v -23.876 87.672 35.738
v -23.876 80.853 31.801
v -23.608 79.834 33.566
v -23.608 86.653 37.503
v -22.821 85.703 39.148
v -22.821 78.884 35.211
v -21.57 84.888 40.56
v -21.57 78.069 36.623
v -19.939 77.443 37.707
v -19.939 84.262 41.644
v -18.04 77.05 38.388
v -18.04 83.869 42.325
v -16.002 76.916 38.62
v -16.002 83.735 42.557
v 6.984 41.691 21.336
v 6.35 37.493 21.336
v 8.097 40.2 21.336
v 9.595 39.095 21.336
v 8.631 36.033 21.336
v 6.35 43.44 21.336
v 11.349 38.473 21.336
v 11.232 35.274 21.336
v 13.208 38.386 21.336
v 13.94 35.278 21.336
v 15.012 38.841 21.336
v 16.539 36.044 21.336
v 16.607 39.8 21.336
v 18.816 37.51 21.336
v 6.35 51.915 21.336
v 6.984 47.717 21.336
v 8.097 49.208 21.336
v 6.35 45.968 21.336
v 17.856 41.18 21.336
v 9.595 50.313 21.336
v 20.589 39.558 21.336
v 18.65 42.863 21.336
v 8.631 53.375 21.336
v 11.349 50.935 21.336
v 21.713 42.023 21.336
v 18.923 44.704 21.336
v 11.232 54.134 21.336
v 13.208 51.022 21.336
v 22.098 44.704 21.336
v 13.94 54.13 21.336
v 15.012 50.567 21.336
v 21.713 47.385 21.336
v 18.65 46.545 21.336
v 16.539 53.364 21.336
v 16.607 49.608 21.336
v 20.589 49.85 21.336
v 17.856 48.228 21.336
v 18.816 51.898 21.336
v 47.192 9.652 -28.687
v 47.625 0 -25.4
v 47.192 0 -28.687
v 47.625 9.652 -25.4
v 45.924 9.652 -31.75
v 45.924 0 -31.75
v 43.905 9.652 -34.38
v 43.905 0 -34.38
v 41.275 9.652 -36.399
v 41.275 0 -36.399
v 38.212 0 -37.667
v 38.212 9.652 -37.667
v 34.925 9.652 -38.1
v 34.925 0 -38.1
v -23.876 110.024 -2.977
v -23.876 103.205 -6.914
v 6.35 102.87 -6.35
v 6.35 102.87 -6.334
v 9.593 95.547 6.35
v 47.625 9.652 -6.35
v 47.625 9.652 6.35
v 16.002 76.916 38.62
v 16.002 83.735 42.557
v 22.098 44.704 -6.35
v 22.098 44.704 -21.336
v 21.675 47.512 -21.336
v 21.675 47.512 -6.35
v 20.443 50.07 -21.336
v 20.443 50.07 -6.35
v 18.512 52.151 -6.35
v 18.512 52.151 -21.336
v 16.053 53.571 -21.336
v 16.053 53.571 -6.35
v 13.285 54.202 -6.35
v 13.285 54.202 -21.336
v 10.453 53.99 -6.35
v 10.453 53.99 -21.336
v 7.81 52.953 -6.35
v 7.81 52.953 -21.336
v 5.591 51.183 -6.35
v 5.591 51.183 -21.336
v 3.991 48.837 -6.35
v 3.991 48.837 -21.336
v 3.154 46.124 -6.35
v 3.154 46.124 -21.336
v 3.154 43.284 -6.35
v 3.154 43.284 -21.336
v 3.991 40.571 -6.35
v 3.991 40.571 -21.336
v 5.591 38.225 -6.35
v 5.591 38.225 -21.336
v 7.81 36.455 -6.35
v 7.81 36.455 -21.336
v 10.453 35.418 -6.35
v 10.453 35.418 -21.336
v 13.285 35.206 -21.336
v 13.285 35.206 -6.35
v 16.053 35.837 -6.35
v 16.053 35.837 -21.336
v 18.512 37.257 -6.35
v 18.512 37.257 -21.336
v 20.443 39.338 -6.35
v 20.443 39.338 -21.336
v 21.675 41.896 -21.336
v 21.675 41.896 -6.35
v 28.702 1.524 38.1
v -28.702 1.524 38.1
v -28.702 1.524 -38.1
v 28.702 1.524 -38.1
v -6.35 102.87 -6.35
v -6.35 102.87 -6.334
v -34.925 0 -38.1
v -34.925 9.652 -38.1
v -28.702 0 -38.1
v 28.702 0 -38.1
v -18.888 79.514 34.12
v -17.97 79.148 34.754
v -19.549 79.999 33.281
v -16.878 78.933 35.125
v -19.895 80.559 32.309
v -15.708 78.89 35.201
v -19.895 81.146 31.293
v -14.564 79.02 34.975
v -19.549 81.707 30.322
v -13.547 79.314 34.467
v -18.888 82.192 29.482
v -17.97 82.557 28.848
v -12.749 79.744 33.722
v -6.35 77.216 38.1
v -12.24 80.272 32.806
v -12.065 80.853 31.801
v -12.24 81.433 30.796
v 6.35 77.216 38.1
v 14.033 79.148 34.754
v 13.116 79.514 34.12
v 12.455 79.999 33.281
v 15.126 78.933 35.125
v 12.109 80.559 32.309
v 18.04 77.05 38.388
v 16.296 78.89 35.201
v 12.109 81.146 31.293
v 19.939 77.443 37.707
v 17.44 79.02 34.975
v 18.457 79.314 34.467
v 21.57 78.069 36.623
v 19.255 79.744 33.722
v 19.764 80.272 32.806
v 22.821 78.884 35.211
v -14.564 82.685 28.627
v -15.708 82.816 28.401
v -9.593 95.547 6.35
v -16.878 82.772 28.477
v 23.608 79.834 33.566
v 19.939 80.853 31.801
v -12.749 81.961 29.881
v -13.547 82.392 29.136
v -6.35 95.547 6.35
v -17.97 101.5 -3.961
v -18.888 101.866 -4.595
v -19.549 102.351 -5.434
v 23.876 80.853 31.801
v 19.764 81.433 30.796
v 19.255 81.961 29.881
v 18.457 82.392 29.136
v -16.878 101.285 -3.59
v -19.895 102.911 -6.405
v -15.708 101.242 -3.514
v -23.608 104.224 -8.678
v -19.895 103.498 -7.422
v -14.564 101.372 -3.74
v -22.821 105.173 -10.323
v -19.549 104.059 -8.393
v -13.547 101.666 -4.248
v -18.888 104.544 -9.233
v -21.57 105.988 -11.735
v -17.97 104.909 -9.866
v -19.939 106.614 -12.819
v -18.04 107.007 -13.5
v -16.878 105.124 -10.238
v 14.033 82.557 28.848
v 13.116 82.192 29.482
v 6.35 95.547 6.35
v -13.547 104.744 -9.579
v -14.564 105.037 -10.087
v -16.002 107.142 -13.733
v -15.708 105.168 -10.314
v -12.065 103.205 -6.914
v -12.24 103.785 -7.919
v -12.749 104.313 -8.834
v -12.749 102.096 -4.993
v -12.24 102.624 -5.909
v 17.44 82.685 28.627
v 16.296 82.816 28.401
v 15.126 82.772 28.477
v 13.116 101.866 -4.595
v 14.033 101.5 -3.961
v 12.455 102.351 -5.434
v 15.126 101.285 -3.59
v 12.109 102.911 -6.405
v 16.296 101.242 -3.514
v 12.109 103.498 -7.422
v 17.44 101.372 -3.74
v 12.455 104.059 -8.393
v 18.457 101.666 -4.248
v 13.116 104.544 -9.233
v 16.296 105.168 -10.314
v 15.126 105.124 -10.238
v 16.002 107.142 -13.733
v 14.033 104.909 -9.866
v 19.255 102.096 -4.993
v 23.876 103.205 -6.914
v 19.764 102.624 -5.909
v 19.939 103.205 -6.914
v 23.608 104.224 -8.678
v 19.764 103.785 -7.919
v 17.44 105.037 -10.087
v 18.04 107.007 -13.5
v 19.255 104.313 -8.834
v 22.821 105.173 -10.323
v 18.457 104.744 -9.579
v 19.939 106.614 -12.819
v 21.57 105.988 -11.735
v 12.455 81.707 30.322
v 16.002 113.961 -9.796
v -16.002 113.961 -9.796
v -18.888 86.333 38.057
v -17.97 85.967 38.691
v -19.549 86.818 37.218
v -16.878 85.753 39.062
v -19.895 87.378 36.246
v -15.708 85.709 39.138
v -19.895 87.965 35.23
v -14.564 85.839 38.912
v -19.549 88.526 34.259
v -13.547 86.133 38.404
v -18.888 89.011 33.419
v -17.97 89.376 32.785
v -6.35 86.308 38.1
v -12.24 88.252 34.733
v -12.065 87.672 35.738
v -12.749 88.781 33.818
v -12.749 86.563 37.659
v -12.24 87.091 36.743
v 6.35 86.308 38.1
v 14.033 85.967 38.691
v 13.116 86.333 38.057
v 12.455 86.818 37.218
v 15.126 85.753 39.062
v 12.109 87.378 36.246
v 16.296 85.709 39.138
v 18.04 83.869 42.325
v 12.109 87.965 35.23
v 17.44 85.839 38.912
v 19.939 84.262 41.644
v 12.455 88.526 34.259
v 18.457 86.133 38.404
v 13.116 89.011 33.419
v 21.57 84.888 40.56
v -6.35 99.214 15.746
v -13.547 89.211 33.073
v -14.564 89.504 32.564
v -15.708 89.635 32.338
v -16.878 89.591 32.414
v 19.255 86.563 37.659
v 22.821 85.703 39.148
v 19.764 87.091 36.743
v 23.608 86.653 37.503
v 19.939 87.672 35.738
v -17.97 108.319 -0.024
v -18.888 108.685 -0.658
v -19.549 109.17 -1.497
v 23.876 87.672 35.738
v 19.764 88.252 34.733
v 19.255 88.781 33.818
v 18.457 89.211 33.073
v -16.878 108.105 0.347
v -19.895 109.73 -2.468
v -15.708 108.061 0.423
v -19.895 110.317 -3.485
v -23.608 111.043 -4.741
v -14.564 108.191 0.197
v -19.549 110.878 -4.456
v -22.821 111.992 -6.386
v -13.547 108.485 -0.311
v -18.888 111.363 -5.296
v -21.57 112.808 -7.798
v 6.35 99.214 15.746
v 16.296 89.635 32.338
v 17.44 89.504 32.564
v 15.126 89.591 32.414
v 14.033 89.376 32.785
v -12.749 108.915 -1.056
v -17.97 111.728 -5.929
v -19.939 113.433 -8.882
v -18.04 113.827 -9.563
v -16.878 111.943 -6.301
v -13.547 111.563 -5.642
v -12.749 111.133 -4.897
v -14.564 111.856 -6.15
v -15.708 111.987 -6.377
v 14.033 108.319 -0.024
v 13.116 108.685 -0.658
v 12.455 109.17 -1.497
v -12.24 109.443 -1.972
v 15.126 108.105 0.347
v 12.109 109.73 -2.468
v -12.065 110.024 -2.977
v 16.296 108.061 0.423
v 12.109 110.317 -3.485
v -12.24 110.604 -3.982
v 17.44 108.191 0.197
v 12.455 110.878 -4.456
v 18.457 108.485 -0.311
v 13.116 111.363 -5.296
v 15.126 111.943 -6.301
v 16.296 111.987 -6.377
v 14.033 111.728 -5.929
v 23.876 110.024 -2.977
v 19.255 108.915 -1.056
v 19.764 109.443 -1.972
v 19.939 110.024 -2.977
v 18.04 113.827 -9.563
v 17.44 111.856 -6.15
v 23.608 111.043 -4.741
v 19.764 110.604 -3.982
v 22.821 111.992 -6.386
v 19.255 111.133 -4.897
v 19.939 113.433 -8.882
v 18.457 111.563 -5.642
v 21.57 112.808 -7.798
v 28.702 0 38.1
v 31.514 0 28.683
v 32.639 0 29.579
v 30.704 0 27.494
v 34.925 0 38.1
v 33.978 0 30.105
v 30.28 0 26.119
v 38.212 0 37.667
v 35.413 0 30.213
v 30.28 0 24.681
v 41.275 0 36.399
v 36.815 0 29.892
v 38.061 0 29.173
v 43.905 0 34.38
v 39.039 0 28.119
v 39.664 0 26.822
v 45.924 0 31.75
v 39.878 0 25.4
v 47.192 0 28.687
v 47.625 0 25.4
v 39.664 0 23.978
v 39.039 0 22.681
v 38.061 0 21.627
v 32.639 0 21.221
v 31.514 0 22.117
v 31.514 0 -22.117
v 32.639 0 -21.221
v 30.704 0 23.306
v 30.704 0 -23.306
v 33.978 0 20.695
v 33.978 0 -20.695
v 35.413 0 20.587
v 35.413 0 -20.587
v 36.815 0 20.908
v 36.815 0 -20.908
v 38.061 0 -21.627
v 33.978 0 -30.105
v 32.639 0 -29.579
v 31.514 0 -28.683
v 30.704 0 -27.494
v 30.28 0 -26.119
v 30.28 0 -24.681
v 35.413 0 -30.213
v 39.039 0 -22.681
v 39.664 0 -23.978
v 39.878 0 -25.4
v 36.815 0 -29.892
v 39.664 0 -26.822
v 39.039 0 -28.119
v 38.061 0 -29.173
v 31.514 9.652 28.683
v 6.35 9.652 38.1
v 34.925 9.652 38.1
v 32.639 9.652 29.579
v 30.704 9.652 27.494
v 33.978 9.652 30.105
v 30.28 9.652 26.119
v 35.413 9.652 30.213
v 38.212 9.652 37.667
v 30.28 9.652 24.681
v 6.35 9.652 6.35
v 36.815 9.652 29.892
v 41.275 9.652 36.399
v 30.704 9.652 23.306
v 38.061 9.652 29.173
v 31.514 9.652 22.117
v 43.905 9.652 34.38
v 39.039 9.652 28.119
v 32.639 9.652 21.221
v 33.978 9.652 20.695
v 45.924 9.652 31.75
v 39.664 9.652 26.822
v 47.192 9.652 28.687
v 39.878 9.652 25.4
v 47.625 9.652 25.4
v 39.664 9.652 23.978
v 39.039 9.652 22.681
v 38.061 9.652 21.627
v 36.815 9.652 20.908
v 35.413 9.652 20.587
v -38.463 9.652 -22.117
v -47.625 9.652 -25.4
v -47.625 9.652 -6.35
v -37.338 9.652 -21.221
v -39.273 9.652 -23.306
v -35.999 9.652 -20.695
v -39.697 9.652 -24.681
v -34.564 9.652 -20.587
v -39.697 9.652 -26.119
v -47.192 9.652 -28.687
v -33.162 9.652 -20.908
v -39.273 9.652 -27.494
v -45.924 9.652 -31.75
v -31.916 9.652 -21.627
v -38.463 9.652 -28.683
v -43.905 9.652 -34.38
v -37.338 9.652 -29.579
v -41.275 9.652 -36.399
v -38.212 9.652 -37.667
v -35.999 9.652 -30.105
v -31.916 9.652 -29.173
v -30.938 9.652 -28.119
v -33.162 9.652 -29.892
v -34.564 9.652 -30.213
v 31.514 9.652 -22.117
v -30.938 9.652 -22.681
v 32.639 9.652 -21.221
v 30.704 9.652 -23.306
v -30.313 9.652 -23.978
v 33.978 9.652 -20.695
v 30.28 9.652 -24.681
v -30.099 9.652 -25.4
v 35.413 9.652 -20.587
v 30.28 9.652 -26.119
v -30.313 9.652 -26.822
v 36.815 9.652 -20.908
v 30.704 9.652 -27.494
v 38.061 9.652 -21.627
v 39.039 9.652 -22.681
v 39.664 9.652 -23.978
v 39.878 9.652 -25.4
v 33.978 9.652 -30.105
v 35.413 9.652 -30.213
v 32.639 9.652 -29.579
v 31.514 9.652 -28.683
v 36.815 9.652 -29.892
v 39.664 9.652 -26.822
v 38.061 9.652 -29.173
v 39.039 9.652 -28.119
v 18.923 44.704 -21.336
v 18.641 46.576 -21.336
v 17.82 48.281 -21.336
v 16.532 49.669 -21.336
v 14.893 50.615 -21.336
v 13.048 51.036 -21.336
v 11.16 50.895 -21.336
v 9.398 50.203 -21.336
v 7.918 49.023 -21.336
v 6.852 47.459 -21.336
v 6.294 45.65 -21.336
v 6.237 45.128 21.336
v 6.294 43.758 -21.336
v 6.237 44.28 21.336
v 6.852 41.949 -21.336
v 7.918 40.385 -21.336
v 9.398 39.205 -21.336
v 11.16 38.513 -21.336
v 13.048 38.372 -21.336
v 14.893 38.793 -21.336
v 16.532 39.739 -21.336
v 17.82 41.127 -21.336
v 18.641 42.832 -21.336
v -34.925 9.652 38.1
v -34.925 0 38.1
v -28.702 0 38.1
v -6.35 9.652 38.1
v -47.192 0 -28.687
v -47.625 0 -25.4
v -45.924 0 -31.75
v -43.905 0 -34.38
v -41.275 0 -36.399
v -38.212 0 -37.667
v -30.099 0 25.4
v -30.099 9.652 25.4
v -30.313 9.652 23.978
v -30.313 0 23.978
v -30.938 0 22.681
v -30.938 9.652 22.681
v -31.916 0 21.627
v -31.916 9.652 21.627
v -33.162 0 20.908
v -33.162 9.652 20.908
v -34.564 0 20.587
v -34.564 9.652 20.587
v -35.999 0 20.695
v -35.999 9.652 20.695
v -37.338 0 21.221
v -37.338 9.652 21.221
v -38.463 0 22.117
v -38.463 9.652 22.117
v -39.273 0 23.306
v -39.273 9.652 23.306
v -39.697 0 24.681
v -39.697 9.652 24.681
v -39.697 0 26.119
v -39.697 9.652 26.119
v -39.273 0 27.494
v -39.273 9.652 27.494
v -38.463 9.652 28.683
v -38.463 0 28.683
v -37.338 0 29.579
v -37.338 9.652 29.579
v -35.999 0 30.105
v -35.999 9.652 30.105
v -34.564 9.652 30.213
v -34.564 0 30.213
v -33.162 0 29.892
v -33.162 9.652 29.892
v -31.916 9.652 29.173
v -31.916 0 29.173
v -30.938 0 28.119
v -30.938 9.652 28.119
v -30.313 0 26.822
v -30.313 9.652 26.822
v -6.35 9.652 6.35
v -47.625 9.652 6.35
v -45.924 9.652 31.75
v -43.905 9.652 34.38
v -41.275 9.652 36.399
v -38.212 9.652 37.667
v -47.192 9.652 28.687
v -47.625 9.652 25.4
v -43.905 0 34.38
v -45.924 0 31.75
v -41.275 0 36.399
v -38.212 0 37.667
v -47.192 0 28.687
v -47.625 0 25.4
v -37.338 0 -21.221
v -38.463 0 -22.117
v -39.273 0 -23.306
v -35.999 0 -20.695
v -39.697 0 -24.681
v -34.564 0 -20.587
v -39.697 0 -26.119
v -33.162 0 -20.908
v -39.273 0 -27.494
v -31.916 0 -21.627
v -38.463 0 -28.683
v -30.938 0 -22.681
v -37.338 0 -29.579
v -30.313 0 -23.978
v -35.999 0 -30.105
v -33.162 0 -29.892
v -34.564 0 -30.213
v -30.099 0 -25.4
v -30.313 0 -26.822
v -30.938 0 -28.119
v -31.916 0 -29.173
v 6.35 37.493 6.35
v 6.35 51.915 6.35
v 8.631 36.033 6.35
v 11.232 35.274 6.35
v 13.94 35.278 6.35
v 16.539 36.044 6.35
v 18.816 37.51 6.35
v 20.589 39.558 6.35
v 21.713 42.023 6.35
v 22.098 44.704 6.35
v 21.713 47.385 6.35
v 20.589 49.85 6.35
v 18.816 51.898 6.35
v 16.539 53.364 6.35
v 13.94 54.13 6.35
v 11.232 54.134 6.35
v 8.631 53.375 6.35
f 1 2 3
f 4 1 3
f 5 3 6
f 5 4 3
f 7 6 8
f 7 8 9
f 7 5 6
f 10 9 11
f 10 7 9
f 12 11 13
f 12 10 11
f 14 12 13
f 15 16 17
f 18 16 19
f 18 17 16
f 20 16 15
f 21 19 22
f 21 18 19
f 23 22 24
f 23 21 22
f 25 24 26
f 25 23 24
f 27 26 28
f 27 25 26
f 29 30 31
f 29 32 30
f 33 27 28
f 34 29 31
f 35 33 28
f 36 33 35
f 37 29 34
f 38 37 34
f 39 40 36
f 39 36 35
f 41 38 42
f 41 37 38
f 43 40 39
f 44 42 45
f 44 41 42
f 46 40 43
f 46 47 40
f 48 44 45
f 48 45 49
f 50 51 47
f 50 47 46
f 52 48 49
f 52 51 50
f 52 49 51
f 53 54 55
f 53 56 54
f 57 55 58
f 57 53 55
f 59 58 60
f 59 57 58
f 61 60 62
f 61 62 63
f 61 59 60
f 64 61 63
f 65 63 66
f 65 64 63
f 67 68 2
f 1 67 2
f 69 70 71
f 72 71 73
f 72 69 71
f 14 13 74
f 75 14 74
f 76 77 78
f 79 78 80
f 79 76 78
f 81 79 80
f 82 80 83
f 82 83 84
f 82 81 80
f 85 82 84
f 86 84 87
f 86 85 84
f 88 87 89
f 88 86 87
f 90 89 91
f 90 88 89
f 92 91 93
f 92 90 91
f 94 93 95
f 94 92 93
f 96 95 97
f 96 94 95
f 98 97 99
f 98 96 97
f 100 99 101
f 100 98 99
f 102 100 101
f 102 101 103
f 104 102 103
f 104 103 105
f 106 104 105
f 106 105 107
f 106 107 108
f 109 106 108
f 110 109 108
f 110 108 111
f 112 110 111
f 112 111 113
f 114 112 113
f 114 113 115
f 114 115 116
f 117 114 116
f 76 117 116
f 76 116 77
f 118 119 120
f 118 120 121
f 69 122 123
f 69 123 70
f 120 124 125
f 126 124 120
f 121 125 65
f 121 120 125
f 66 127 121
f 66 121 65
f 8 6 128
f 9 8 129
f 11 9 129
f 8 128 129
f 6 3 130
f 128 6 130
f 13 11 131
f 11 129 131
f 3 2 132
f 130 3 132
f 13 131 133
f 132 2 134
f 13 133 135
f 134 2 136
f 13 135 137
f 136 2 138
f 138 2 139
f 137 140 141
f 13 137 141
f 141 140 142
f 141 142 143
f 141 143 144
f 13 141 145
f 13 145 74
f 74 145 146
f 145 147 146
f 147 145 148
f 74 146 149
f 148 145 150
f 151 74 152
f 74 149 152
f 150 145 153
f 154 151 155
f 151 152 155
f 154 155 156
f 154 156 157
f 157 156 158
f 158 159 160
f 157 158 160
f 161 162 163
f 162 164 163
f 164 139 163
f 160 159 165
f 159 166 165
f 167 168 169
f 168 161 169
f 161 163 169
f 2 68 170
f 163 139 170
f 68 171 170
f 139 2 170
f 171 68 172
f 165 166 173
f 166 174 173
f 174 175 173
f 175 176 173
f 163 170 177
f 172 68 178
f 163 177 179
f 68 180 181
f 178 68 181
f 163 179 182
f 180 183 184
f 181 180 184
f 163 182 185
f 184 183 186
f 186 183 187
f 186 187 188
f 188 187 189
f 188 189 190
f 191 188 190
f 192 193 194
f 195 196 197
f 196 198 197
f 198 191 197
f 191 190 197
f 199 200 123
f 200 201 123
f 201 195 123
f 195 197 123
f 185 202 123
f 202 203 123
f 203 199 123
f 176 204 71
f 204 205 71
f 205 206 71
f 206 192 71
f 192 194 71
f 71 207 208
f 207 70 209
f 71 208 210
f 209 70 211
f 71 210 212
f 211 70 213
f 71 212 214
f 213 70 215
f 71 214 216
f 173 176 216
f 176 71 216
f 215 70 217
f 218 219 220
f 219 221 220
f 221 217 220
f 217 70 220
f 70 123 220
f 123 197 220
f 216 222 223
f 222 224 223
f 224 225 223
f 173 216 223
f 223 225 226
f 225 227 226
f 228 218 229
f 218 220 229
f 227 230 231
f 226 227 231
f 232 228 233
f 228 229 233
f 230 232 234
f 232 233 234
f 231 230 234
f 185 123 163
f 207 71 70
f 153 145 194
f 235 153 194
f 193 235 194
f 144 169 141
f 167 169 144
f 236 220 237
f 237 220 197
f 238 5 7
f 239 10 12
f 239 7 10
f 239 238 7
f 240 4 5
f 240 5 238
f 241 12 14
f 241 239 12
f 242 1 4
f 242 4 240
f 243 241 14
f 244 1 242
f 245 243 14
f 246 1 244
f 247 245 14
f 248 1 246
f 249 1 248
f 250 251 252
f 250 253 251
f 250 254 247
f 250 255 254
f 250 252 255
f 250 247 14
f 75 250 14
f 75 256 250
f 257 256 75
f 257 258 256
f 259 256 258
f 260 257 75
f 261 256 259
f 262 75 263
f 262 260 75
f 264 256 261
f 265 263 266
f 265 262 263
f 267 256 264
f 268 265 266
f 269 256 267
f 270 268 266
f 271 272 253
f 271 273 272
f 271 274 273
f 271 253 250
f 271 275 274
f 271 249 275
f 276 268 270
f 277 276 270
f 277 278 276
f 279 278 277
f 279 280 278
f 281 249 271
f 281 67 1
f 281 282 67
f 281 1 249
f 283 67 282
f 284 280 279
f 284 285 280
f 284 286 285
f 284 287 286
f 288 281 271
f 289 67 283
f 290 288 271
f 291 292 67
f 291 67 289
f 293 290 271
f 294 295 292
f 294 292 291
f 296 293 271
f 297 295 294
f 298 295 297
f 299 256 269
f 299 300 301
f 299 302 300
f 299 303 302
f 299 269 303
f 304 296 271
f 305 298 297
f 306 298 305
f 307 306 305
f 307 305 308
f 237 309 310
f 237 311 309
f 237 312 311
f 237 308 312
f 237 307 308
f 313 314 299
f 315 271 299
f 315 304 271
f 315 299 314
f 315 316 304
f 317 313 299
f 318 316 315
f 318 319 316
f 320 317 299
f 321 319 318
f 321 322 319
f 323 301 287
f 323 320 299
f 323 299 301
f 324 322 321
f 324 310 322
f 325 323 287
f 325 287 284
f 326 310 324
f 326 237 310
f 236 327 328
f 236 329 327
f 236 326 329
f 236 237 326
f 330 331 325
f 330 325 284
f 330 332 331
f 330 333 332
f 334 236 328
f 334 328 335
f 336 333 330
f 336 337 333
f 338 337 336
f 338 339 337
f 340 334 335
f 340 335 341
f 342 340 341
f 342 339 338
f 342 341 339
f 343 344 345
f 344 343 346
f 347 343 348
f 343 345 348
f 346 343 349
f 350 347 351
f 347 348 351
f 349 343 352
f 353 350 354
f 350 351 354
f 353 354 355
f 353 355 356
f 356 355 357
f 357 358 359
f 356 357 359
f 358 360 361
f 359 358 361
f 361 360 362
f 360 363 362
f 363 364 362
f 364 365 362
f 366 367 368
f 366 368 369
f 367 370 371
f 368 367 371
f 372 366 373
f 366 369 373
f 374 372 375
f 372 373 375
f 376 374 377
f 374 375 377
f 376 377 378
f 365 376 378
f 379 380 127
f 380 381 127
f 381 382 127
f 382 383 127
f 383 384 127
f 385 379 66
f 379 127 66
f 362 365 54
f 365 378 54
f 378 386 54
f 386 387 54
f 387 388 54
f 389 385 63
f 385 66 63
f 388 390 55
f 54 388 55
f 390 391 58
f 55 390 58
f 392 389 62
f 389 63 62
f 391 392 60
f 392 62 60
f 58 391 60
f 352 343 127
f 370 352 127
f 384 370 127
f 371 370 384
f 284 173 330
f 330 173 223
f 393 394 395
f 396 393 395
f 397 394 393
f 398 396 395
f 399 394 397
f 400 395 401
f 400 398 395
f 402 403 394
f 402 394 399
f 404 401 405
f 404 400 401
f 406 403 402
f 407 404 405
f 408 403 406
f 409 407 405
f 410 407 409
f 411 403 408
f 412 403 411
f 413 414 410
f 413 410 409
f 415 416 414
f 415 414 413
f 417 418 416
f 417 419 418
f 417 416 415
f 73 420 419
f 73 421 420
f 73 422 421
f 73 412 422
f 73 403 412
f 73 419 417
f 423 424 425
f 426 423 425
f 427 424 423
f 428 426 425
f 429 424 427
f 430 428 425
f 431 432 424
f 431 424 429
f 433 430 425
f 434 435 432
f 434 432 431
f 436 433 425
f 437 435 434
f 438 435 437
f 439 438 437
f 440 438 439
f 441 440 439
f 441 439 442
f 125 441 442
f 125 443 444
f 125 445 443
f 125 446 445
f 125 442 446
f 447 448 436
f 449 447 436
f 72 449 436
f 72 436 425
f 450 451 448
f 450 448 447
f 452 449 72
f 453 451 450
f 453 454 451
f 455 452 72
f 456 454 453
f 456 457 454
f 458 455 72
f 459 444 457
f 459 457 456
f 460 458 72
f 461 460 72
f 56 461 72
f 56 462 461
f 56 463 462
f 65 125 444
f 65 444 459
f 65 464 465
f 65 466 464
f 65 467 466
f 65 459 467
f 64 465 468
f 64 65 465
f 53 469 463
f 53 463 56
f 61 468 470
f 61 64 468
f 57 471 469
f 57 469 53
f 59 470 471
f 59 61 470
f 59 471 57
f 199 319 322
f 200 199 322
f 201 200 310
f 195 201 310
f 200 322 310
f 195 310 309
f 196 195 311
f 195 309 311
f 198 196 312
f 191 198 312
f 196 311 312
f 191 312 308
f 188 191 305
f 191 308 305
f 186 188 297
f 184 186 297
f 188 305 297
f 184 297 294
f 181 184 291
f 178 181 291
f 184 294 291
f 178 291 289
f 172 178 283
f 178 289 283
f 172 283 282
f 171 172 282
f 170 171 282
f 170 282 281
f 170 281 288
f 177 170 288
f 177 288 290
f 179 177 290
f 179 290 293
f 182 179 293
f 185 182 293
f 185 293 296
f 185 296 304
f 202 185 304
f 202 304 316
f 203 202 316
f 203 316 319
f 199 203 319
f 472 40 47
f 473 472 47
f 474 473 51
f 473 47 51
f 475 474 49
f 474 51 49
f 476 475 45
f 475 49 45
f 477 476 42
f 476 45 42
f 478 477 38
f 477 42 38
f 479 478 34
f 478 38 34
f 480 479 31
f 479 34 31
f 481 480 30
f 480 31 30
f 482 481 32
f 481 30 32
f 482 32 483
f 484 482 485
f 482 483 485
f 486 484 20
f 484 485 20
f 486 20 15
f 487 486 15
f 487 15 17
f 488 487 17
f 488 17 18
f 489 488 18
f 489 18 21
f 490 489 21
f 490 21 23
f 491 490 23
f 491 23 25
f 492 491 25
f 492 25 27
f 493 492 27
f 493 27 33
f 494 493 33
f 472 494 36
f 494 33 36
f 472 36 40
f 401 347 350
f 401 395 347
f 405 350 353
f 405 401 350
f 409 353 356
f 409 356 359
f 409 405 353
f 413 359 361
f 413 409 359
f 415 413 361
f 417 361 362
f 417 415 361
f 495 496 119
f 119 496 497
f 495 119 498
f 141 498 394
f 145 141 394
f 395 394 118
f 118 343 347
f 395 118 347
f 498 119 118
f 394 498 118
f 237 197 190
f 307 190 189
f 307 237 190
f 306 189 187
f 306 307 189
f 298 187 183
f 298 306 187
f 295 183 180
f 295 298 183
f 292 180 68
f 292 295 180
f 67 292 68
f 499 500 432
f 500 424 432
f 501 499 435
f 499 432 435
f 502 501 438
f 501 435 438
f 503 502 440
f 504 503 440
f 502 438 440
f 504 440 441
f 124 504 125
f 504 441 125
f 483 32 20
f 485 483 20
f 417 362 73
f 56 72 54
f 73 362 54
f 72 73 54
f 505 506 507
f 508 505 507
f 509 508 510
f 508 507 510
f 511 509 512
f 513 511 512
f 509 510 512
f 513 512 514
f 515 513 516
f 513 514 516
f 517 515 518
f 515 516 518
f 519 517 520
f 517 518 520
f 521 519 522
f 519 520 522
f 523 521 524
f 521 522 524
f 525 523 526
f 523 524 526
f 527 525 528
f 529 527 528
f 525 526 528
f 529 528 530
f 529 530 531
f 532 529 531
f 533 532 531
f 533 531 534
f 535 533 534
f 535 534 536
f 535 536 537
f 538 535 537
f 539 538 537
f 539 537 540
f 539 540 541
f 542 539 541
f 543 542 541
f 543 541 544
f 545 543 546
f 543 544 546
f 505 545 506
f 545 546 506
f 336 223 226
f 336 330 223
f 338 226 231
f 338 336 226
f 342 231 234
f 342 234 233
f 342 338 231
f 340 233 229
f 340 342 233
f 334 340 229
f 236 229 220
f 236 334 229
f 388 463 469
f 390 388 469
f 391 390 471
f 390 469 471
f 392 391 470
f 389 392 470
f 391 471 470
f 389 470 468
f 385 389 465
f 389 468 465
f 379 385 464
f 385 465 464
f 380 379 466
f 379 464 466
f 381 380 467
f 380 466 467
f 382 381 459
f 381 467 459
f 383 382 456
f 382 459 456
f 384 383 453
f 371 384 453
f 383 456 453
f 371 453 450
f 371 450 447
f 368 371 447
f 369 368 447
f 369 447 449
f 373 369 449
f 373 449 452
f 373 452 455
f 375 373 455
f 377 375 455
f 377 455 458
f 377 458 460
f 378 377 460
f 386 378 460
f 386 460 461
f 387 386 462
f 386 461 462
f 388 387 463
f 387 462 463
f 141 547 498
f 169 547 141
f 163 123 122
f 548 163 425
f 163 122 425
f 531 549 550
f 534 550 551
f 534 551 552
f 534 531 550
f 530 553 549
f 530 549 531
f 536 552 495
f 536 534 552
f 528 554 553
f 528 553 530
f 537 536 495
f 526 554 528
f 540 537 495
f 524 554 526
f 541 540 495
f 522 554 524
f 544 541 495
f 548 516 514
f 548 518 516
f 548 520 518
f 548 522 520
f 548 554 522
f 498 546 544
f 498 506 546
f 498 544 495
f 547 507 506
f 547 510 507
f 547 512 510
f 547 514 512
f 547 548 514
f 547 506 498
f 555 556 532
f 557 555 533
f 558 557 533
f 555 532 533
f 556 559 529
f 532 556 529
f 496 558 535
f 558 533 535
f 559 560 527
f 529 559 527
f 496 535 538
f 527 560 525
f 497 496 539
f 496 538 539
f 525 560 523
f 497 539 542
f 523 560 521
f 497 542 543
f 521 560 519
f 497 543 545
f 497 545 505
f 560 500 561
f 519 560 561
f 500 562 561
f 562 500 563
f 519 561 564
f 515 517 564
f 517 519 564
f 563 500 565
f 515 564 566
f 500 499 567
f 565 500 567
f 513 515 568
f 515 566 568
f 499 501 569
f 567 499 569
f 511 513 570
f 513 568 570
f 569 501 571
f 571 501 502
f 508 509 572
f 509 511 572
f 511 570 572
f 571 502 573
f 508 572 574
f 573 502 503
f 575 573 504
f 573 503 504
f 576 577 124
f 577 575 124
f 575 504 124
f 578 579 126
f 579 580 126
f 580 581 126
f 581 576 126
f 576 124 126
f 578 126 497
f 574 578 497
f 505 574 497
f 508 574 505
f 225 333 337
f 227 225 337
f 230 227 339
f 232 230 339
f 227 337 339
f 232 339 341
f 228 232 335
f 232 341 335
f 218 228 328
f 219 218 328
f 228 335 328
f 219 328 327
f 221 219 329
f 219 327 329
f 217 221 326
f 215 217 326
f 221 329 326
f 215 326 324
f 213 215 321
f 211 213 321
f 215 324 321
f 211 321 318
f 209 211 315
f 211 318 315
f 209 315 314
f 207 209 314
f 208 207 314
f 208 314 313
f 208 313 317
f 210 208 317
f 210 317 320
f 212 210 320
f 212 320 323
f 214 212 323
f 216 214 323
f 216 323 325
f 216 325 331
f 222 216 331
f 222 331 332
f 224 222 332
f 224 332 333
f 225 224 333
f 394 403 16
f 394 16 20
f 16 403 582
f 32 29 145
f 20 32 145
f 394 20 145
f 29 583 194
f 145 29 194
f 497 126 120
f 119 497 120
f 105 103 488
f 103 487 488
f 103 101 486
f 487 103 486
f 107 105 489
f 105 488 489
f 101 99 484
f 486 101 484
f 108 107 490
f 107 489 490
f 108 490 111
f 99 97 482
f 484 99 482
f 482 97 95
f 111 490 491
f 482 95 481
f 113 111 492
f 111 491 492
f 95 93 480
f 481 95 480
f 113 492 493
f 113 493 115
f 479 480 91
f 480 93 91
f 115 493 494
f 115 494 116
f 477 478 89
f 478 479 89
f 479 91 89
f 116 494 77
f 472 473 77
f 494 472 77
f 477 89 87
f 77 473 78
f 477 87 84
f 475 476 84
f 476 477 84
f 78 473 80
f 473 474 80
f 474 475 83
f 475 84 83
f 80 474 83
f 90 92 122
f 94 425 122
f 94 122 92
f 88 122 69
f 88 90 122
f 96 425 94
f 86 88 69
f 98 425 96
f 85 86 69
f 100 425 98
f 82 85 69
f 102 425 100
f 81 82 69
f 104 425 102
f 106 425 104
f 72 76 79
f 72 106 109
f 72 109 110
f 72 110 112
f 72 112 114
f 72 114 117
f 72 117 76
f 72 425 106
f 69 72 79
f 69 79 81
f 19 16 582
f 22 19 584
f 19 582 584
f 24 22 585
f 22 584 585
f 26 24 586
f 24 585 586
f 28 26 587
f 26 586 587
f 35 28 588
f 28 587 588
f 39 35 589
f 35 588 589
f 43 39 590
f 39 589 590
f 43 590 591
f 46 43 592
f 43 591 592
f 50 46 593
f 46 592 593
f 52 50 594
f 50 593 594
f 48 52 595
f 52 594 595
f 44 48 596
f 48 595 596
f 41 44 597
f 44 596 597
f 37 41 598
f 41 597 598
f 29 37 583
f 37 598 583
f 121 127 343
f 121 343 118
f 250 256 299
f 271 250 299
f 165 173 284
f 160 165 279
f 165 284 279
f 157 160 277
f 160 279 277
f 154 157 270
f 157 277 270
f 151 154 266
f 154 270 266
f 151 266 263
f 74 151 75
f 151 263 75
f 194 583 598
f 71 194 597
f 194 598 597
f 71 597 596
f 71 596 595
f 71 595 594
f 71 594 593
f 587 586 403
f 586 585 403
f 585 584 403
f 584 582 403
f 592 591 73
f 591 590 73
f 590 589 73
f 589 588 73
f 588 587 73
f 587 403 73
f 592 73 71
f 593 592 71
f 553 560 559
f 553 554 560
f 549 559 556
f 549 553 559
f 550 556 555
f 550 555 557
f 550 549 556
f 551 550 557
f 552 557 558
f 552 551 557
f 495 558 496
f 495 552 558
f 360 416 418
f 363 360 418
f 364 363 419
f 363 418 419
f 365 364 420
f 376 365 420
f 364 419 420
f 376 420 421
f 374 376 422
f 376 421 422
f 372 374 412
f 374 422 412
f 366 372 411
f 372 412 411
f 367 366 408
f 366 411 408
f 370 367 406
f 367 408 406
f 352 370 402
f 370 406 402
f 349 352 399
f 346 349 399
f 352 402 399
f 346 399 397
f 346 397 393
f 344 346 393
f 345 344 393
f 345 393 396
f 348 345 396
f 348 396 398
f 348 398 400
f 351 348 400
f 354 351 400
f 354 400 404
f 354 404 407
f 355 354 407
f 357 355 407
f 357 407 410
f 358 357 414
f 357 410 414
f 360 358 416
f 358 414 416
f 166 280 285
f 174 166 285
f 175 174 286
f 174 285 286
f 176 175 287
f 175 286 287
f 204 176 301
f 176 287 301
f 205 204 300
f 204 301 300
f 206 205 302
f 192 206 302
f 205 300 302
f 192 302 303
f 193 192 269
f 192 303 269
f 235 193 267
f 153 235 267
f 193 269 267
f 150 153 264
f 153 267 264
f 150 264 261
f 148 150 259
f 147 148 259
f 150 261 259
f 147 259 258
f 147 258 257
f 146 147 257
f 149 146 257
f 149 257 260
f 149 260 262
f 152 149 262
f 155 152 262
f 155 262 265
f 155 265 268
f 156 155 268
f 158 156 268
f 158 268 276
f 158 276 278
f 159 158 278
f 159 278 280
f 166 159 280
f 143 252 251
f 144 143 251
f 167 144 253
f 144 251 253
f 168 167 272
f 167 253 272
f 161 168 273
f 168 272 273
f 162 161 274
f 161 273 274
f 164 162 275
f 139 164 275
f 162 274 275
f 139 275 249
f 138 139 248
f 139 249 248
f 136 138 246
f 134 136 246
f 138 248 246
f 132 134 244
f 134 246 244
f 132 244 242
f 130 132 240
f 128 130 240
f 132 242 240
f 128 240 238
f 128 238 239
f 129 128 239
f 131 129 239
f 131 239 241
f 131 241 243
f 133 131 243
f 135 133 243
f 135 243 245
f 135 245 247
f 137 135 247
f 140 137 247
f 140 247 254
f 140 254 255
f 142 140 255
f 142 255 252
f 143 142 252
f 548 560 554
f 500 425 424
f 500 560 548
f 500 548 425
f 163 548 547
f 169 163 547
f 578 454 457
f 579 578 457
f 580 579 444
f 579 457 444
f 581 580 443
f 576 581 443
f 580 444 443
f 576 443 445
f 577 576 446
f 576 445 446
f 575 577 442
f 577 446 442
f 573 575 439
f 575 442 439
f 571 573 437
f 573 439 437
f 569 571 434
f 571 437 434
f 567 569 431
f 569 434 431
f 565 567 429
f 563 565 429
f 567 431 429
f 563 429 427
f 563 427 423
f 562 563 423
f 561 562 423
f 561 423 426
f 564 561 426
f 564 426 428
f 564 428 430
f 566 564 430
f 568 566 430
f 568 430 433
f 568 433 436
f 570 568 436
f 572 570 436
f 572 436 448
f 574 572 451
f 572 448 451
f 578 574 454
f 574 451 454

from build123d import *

# Parameters (mm, degrees)
CROQUIS3_W               = 95.25
CROQUIS3_H               = 76.2
SALIENTE_EXTRUIR1_DEPTH  = 9.652
REDONDEO1_R              = 12.7
CROQUIS4_R               = 4.826
CORTAR_EXTRUIR2_DEPTH    = 9.652
CROQUIS6_W               = 12.7
CROQUIS6_H               = 43.017724406
SALIENTE_EXTRUIR3_DEPTH  = 67.564
CROQUIS8_W               = 95.25
CROQUIS8_H               = 12.7
SALIENTE_EXTRUIR4_DEPTH  = 93.218
SALIENTE_EXTRUIR10_DEPTH = 7.874
CORTAR_EXTRUIR8_DEPTH    = 12.7
CROQUIS14_R              = 9.525
SALIENTE_EXTRUIR7_DEPTH  = 14.986
CROQUIS16_R              = 9.525
SALIENTE_EXTRUIR8_DEPTH  = 27.686
CROQUIS17_R              = 6.35
CORTAR_EXTRUIR10_DEPTH   = 60.436
CORTAR_EXTRUIR13_DEPTH   = 12.7
REDONDEO3_R              = 7.874
CROQUIS24_R              = 3.937
CORTAR_EXTRUIR14_DEPTH   = 12.7
CROQUIS25_W              = 12.7
CROQUIS25_H              = 21.99844938
SALIENTE_EXTRUIR11_DEPTH = 31.75
CORTAR_EXTRUIR15_DEPTH   = 31.75
CROQUIS27_W              = 57.404
CROQUIS27_H              = 1.524
CORTAR_EXTRUIR16_DEPTH   = 77.2


with BuildPart() as part:
    # Croquis3 → Saliente-Extruir1 (new body)
    with BuildSketch(Plane(origin=(0, 0, 0), x_dir=(1, 0, 0), z_dir=(0, 1, 0))):
        Rectangle(CROQUIS3_W, CROQUIS3_H)
    extrude(amount=SALIENTE_EXTRUIR1_DEPTH)

    # Redondeo1
    redondeo1_edges = [part.edges().sort_by_distance(p)[0] for p in [
        (47.625, 4.826, 38.1),
        (-47.625, 4.826, 38.1),
        (-47.625, 4.826, -38.1),
        (47.625, 4.826, -38.1),
    ]]
    fillet(redondeo1_edges, radius=REDONDEO1_R)

    # Croquis4 → Cortar-Extruir2 (cut)
    with BuildSketch(Plane(origin=(0, 9.652, 0), x_dir=(1, 0, 0), z_dir=(0, 1, 0))):
        with Locations((-34.925, -25.4)):
            Circle(CROQUIS4_R)
        with Locations((35.052, -25.4)):
            Circle(CROQUIS4_R)
        with Locations((35.052, 25.4)):
            Circle(CROQUIS4_R)
        with Locations((-34.925, 25.4)):
            Circle(CROQUIS4_R)
    extrude(amount=-CORTAR_EXTRUIR2_DEPTH, mode=Mode.SUBTRACT)

    # Croquis6 → Saliente-Extruir3 (add)
    with BuildSketch(Plane(origin=(0, 9.652, 0), x_dir=(1, 0, 0), z_dir=(0, 1, 0))):
        with Locations((0, -16.591137797)):
            Rectangle(CROQUIS6_W, CROQUIS6_H)
    extrude(amount=SALIENTE_EXTRUIR3_DEPTH)

    # Croquis8 → Saliente-Extruir4 (add)
    with BuildSketch(Plane(origin=(0, 9.652, 0), x_dir=(1, 0, 0), z_dir=(0, 1, 0))):
        Rectangle(CROQUIS8_W, CROQUIS8_H)
    extrude(amount=SALIENTE_EXTRUIR4_DEPTH)

    # Croquis11 → Cortar-Extruir8 (cut)
    with BuildSketch(Plane(origin=(0, 0, -6.35), x_dir=(-1, 0, 0), z_dir=(0, 0, -1))):
        Polygon((-6.35, 102.87), (-47.625, 9.652), (-47.625, 102.87), align=None)
    extrude(amount=-CORTAR_EXTRUIR8_DEPTH, mode=Mode.SUBTRACT)

    # Croquis14 → Saliente-Extruir7 (add)
    with BuildSketch(Plane.XY.offset(6.35)):
        with Locations((12.573, 44.704)):
            Circle(CROQUIS14_R)
    extrude(amount=SALIENTE_EXTRUIR7_DEPTH)

    # Croquis16 → Saliente-Extruir8 (add)
    with BuildSketch(Plane.XY.offset(6.35)):
        with Locations((12.573, 44.704)):
            Circle(CROQUIS16_R)
    extrude(amount=-SALIENTE_EXTRUIR8_DEPTH)

    # Croquis17 → Cortar-Extruir10 (cut, through all)
    with BuildSketch(Plane.XY.offset(21.336)):
        with Locations((12.573, 44.704)):
            Circle(CROQUIS17_R)
    extrude(amount=-CORTAR_EXTRUIR10_DEPTH, mode=Mode.SUBTRACT)

    # Croquis13 → Cortar-Extruir13 (cut)
    with BuildSketch(Plane(origin=(0, 0, -6.35), x_dir=(-1, 0, 0), z_dir=(0, 0, -1))):
        Polygon((6.35, 102.87), (47.625, 9.652), (47.625, 102.87), align=None)
    extrude(amount=-CORTAR_EXTRUIR13_DEPTH, mode=Mode.SUBTRACT)



with BuildPart() as body_2:
    # Croquis23 → Saliente-Extruir10 (new body)
    with BuildSketch(Plane(origin=(0, 74.409783942, 42.960508789), x_dir=(1, 0, 0), z_dir=(0, 0.866025404, 0.5))):
        Polygon((0, 5.011636093), (23.876, 5.011636093), (23.876, 65.463636093), (-23.876, 65.463636093), (-23.876, 5.011636093), align=None)
    extrude(amount=SALIENTE_EXTRUIR10_DEPTH)

    # Redondeo3
    redondeo3_edges = [body_2.edges().sort_by_distance(p)[0] for p in [
        (-23.876, 80.325144003, 40.588804619),
        (-23.876, 110.551144003, -11.764163091),
        (23.876, 110.551144003, -11.764163091),
        (23.876, 80.325144003, 40.588804619),
    ]]
    fillet(redondeo3_edges, radius=REDONDEO3_R)

    # Croquis24 → Cortar-Extruir14 (cut)
    with BuildSketch(Plane(origin=(0, 81.228867971, 46.897508789), x_dir=(1, 0, 0), z_dir=(0, 0.866025404, 0.5))):
        with Locations((-16.002, 12.885636093)):
            Circle(CROQUIS24_R)
        with Locations((16.002, 12.885636093)):
            Circle(CROQUIS24_R)
        with Locations((-16.002, 57.589636093)):
            Circle(CROQUIS24_R)
        with Locations((16.002, 57.589636093)):
            Circle(CROQUIS24_R)
    extrude(amount=-CORTAR_EXTRUIR14_DEPTH, mode=Mode.SUBTRACT)


with BuildPart() as part_1:
    add(part.part)

    add(body_2.part)  # Saliente-Extruir11 merges body 2
    # Croquis25 → Saliente-Extruir11 (add)
    with BuildSketch(Plane.XY.offset(6.35)):
        with Locations((0, 88.21522469)):
            Rectangle(CROQUIS25_W, CROQUIS25_H)
    extrude(amount=SALIENTE_EXTRUIR11_DEPTH)

    # Croquis26 → Cortar-Extruir15 (cut)
    with BuildSketch(Plane(origin=(6.35, 0, 0), x_dir=(0, 0, -1), z_dir=(1, 0, 0))):
        Polygon((-15.745567986, 99.21444938), (-38.1, 99.21444938), (-38.1, 86.308112039), align=None)
    extrude(amount=-CORTAR_EXTRUIR15_DEPTH, mode=Mode.SUBTRACT)

    # Croquis27 → Cortar-Extruir16 (cut, through all)
    with BuildSketch(Plane.XY.offset(38.1)):
        with Locations((0, 0.762)):
            Rectangle(CROQUIS27_W, CROQUIS27_H)
    extrude(amount=-CORTAR_EXTRUIR16_DEPTH, mode=Mode.SUBTRACT)


solid = part_1.part
